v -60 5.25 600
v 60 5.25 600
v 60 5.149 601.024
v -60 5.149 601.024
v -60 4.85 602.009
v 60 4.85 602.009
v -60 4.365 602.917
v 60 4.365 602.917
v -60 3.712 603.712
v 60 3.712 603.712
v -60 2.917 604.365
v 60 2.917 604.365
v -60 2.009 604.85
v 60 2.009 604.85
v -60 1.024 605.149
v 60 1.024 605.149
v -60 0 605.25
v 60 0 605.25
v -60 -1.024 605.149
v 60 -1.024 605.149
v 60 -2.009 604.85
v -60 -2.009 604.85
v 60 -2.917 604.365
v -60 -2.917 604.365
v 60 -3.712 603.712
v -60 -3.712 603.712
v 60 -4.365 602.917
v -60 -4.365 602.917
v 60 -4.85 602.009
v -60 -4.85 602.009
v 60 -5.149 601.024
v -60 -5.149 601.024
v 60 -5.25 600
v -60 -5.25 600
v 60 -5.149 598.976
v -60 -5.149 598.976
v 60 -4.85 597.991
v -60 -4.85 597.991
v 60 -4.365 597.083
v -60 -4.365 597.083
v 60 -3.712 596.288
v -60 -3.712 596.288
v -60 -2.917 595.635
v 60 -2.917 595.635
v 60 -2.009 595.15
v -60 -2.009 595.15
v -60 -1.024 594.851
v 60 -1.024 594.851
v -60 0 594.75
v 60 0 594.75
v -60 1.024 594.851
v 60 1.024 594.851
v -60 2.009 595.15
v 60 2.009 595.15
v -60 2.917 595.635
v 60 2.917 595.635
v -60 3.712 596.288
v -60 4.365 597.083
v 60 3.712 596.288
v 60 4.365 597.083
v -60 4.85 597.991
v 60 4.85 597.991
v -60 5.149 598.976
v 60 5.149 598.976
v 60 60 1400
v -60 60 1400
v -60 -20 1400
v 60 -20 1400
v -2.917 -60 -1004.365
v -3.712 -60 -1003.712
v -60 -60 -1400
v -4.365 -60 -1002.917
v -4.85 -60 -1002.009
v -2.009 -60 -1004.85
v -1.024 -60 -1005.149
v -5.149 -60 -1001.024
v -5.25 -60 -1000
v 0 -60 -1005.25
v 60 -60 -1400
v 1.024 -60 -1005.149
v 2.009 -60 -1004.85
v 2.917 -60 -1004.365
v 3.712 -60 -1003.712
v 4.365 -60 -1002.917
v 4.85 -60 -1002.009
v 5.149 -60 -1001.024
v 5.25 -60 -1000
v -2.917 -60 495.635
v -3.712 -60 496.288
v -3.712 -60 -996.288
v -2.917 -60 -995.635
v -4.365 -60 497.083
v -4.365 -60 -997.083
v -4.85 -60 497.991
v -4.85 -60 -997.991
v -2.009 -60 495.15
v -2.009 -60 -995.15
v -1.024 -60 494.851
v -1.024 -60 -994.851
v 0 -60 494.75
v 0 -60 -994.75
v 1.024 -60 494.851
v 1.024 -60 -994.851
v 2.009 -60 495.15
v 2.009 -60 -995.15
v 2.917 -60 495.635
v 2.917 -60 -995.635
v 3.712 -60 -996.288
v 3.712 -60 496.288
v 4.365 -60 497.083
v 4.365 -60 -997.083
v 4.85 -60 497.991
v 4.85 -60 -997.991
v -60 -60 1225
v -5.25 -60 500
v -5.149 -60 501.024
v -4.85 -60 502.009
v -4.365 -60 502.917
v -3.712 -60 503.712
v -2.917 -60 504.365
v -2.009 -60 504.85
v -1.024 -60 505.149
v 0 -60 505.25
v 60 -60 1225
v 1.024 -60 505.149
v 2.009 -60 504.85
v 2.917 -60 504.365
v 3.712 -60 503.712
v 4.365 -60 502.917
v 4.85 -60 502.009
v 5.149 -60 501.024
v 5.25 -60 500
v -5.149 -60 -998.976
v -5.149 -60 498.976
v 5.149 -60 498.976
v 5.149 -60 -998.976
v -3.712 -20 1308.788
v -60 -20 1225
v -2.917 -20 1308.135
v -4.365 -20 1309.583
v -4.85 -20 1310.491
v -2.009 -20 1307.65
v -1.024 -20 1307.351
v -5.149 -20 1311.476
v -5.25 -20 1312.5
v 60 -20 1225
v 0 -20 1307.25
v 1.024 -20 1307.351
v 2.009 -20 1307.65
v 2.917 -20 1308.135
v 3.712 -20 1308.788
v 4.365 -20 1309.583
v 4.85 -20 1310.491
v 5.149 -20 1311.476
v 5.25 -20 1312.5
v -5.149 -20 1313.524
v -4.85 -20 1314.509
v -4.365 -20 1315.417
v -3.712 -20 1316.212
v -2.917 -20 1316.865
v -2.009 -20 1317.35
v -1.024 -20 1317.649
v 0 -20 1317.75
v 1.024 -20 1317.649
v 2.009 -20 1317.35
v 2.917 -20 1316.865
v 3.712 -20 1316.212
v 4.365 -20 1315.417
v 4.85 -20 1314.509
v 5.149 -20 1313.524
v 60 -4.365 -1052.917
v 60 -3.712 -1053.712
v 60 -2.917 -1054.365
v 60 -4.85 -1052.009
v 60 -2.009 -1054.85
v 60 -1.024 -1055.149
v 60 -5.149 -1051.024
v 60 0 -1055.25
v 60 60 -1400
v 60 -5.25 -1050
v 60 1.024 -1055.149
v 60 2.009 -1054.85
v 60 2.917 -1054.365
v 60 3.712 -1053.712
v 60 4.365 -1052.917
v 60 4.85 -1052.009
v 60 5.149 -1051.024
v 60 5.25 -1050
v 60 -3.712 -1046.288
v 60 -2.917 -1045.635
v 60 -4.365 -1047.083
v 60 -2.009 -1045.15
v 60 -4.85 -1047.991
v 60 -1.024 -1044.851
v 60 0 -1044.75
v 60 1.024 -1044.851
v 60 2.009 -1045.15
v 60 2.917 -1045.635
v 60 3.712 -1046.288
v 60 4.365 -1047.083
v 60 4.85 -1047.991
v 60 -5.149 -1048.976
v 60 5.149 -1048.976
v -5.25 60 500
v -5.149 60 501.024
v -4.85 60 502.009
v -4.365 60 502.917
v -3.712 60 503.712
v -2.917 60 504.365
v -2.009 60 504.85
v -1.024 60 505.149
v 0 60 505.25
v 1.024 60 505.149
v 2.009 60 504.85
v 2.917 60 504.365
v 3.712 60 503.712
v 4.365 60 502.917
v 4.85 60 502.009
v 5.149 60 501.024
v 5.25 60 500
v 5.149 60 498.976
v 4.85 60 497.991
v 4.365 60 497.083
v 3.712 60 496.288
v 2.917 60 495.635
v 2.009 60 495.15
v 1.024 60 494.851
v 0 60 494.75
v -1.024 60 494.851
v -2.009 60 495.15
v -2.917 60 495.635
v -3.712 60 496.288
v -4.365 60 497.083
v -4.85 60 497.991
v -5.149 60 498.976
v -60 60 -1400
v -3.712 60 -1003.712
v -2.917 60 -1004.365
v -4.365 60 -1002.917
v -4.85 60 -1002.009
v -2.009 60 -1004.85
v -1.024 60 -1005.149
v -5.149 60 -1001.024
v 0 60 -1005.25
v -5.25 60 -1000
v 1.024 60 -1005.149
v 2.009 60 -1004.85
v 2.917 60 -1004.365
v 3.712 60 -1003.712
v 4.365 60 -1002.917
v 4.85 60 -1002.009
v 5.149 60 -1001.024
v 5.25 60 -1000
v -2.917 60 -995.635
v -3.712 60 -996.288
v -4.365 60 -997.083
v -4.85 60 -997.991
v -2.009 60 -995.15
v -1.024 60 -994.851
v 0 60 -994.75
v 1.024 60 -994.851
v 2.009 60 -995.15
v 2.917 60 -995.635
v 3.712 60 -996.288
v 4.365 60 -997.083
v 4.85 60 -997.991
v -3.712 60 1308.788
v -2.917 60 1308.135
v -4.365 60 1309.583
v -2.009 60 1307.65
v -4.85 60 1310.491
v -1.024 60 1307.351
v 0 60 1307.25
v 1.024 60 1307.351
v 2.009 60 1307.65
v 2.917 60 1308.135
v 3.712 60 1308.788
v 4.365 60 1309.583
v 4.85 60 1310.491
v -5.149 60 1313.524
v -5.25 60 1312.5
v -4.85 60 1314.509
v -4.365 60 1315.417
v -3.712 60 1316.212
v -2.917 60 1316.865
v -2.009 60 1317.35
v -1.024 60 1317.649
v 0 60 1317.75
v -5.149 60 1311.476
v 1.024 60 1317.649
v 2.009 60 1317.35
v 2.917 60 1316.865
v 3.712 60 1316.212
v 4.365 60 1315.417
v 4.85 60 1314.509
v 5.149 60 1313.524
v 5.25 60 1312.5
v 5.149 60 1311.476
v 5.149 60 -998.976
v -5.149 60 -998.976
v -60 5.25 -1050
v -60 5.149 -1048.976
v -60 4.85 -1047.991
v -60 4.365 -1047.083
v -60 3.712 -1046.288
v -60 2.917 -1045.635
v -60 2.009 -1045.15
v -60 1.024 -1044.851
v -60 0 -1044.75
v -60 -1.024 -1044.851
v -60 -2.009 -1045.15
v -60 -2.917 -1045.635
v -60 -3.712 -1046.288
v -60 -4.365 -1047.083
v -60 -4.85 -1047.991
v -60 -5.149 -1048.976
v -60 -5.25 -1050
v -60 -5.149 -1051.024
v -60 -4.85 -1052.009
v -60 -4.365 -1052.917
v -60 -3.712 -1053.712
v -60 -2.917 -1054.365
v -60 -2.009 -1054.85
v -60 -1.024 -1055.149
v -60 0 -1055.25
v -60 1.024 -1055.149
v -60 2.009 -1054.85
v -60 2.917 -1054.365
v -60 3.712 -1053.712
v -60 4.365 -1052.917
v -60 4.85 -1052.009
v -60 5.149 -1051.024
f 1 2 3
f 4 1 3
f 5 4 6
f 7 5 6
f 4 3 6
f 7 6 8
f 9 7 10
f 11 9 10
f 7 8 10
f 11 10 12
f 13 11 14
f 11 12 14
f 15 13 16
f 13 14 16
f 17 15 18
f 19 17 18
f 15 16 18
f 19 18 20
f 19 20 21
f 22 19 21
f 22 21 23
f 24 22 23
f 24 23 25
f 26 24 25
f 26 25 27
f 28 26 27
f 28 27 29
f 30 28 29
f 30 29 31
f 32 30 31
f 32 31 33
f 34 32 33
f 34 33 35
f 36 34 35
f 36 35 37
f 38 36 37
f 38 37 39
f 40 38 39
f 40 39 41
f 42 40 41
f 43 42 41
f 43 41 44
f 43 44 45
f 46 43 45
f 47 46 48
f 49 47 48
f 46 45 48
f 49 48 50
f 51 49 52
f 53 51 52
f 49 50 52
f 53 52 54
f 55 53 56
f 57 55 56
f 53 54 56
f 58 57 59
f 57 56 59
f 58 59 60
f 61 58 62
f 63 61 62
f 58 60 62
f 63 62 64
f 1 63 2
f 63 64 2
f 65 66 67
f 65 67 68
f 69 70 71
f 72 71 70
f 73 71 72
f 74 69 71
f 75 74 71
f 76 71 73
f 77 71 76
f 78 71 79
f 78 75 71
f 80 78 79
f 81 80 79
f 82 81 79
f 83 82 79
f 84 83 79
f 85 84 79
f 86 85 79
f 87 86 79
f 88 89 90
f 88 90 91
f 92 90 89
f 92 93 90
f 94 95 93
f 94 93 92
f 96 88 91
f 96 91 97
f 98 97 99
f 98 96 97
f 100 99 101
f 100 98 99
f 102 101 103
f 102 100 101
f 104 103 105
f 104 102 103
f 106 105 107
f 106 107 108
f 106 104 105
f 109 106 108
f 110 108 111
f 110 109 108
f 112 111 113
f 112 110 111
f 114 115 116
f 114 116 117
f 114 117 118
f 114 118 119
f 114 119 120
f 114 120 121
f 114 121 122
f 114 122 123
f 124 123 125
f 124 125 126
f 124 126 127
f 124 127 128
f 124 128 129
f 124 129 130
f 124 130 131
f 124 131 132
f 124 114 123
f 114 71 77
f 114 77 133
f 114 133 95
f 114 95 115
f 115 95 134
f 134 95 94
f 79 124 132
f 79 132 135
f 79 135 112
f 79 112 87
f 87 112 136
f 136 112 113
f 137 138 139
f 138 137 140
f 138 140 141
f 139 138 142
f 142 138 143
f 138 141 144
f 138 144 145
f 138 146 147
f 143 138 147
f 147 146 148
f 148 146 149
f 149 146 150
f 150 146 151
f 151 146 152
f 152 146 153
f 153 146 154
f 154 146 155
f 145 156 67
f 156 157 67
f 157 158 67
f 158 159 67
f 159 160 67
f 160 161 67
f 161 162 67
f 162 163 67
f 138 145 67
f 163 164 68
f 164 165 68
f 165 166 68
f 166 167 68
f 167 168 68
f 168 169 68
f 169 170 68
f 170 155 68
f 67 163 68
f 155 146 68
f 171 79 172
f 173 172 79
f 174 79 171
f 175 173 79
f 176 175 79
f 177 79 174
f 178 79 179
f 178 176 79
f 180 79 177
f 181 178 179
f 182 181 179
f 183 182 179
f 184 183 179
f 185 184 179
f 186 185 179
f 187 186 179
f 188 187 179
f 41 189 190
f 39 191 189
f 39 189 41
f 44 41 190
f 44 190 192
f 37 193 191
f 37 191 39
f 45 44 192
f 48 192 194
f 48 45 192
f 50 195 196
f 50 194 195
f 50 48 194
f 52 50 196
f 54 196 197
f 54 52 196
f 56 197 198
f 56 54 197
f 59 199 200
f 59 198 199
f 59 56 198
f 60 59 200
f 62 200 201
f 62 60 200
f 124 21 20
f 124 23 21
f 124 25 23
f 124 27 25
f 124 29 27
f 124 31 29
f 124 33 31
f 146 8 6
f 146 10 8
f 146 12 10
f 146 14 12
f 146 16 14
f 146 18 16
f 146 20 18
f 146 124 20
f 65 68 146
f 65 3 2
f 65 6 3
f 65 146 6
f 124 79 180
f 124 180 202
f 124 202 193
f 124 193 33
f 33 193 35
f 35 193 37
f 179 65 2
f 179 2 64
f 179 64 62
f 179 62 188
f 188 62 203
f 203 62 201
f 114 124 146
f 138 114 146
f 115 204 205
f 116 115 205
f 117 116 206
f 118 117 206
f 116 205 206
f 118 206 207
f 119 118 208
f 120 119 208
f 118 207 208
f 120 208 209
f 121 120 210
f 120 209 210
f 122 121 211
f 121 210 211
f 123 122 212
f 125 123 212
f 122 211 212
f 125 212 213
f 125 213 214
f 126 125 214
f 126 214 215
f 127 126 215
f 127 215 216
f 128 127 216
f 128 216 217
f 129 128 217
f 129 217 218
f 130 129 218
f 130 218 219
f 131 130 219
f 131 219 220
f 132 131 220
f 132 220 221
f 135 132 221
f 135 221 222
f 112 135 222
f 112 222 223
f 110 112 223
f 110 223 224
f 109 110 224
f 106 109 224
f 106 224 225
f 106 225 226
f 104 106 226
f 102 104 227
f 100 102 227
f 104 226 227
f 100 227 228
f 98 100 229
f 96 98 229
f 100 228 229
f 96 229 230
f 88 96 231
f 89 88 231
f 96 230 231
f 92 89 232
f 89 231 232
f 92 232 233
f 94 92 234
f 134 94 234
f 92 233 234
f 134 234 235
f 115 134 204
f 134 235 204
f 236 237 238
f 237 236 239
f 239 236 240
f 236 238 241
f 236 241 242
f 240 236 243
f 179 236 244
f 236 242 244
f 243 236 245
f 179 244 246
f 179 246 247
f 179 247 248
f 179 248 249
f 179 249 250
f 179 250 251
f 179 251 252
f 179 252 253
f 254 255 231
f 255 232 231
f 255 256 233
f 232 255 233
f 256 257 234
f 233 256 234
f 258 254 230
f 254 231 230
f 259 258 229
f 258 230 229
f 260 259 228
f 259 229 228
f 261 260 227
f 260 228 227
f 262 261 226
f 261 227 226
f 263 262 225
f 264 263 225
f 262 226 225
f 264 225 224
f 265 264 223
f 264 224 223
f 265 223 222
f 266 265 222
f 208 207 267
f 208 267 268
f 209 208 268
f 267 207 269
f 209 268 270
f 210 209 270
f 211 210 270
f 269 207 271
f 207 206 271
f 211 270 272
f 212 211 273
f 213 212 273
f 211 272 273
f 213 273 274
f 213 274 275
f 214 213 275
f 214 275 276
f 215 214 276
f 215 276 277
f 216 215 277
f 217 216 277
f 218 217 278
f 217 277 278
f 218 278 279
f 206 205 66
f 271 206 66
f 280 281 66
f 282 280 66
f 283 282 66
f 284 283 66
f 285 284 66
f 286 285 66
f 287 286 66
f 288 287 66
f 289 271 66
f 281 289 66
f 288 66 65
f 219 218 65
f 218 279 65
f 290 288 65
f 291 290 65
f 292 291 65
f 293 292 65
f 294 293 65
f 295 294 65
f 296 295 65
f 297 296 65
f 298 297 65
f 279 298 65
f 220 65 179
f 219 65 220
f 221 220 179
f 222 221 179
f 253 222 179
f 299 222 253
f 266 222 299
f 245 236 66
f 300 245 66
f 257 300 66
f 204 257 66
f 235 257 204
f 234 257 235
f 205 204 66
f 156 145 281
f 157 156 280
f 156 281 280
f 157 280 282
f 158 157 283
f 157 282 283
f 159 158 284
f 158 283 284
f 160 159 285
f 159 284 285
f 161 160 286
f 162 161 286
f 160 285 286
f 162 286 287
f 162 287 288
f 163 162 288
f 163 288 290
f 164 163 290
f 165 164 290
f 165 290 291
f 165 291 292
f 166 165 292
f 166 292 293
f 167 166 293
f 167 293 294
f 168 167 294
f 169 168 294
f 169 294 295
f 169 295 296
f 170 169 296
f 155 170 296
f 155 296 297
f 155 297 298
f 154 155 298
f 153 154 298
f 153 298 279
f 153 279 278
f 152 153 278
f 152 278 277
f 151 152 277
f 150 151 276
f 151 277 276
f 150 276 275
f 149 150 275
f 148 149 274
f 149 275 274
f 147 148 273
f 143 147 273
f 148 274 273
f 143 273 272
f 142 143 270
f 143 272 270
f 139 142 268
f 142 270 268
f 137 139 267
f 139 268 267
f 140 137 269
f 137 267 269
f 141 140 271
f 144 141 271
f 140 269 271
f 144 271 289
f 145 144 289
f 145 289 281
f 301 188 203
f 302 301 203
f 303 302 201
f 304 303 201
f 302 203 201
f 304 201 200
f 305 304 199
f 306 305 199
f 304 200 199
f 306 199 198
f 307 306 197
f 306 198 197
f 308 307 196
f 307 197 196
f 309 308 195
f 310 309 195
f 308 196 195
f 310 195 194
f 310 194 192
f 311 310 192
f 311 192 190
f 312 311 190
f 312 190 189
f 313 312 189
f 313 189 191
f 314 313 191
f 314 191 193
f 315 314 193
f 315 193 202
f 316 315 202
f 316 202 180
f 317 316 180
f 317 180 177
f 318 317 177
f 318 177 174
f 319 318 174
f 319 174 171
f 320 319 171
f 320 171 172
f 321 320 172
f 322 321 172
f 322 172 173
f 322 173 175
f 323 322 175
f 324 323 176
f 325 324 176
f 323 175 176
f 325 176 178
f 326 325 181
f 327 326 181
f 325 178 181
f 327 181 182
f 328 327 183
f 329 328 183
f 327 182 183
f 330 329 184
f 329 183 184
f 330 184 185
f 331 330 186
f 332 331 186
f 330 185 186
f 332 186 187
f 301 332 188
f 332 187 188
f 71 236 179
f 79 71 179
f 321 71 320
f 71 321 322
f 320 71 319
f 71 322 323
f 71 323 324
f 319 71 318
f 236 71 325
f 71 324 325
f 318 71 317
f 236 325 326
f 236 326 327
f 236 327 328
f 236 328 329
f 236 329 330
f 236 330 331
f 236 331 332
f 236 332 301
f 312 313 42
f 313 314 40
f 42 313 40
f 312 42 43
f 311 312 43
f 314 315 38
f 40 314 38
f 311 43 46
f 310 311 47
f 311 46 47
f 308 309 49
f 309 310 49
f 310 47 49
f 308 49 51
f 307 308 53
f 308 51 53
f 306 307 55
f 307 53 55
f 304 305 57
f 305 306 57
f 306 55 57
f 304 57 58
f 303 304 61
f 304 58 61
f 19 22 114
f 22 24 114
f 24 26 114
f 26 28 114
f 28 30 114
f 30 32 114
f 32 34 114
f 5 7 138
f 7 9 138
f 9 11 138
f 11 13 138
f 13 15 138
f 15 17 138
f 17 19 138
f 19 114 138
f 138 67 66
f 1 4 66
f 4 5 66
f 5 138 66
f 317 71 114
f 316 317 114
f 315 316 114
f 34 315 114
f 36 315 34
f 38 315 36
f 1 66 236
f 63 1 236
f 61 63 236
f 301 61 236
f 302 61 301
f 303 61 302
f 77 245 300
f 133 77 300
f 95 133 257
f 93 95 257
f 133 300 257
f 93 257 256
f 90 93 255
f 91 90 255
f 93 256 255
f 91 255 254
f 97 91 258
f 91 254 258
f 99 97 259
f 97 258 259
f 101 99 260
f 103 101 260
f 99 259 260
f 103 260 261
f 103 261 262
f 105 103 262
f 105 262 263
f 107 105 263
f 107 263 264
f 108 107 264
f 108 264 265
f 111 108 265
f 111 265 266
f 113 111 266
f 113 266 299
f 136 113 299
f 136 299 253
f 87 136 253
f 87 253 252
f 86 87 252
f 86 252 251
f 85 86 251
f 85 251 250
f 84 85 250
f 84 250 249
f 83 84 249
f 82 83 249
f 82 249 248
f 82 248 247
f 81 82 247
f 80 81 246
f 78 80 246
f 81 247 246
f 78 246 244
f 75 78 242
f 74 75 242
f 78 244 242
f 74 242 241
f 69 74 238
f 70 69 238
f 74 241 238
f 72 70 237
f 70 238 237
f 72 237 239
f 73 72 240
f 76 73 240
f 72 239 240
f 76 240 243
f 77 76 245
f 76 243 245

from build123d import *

# Parameters (mm, degrees)
F0_W     = 120
F0_H     = 120
F1_DEPTH = 1400
F2_W     = 40
F2_H     = 175
F3_DEPTH = 120
F4_R     = 5.25
F5_DEPTH = 120.001
F6_R     = 5.25
F7_DEPTH = 120.001


with BuildPart() as f1:
    # F0 (on Top) → F1 (new body, symmetric)
    with BuildSketch(Plane.XY):
        Rectangle(F0_W, F0_H)
    extrude(amount=F1_DEPTH, both=True)

    # F2 (on face) → F3 (cut, through all)
    with BuildSketch(Plane.YZ.offset(60)):
        with Locations((-40, 1312.5)):
            Rectangle(F2_W, F2_H)
    extrude(amount=-F3_DEPTH, mode=Mode.SUBTRACT)

    # F4 (on face) → F5 (cut, through all)
    with BuildSketch(Plane(origin=(0, 60, 0), x_dir=(-1, 0, 0), z_dir=(0, 1, 0))):
        with Locations((0, 1312.5)):
            Circle(F4_R)
        with Locations((0, -1000)):
            Circle(F4_R)
        with Locations((0, 500)):
            Circle(F4_R)
    extrude(amount=-F5_DEPTH, mode=Mode.SUBTRACT)

    # F6 (on face) → F7 (cut, through all)
    with BuildSketch(Plane.YZ.offset(60)):
        with Locations((0, -1050)):
            Circle(F6_R)
        with Locations((0, 600)):
            Circle(F6_R)
    extrude(amount=-F7_DEPTH, mode=Mode.SUBTRACT)


solid = f1.part
